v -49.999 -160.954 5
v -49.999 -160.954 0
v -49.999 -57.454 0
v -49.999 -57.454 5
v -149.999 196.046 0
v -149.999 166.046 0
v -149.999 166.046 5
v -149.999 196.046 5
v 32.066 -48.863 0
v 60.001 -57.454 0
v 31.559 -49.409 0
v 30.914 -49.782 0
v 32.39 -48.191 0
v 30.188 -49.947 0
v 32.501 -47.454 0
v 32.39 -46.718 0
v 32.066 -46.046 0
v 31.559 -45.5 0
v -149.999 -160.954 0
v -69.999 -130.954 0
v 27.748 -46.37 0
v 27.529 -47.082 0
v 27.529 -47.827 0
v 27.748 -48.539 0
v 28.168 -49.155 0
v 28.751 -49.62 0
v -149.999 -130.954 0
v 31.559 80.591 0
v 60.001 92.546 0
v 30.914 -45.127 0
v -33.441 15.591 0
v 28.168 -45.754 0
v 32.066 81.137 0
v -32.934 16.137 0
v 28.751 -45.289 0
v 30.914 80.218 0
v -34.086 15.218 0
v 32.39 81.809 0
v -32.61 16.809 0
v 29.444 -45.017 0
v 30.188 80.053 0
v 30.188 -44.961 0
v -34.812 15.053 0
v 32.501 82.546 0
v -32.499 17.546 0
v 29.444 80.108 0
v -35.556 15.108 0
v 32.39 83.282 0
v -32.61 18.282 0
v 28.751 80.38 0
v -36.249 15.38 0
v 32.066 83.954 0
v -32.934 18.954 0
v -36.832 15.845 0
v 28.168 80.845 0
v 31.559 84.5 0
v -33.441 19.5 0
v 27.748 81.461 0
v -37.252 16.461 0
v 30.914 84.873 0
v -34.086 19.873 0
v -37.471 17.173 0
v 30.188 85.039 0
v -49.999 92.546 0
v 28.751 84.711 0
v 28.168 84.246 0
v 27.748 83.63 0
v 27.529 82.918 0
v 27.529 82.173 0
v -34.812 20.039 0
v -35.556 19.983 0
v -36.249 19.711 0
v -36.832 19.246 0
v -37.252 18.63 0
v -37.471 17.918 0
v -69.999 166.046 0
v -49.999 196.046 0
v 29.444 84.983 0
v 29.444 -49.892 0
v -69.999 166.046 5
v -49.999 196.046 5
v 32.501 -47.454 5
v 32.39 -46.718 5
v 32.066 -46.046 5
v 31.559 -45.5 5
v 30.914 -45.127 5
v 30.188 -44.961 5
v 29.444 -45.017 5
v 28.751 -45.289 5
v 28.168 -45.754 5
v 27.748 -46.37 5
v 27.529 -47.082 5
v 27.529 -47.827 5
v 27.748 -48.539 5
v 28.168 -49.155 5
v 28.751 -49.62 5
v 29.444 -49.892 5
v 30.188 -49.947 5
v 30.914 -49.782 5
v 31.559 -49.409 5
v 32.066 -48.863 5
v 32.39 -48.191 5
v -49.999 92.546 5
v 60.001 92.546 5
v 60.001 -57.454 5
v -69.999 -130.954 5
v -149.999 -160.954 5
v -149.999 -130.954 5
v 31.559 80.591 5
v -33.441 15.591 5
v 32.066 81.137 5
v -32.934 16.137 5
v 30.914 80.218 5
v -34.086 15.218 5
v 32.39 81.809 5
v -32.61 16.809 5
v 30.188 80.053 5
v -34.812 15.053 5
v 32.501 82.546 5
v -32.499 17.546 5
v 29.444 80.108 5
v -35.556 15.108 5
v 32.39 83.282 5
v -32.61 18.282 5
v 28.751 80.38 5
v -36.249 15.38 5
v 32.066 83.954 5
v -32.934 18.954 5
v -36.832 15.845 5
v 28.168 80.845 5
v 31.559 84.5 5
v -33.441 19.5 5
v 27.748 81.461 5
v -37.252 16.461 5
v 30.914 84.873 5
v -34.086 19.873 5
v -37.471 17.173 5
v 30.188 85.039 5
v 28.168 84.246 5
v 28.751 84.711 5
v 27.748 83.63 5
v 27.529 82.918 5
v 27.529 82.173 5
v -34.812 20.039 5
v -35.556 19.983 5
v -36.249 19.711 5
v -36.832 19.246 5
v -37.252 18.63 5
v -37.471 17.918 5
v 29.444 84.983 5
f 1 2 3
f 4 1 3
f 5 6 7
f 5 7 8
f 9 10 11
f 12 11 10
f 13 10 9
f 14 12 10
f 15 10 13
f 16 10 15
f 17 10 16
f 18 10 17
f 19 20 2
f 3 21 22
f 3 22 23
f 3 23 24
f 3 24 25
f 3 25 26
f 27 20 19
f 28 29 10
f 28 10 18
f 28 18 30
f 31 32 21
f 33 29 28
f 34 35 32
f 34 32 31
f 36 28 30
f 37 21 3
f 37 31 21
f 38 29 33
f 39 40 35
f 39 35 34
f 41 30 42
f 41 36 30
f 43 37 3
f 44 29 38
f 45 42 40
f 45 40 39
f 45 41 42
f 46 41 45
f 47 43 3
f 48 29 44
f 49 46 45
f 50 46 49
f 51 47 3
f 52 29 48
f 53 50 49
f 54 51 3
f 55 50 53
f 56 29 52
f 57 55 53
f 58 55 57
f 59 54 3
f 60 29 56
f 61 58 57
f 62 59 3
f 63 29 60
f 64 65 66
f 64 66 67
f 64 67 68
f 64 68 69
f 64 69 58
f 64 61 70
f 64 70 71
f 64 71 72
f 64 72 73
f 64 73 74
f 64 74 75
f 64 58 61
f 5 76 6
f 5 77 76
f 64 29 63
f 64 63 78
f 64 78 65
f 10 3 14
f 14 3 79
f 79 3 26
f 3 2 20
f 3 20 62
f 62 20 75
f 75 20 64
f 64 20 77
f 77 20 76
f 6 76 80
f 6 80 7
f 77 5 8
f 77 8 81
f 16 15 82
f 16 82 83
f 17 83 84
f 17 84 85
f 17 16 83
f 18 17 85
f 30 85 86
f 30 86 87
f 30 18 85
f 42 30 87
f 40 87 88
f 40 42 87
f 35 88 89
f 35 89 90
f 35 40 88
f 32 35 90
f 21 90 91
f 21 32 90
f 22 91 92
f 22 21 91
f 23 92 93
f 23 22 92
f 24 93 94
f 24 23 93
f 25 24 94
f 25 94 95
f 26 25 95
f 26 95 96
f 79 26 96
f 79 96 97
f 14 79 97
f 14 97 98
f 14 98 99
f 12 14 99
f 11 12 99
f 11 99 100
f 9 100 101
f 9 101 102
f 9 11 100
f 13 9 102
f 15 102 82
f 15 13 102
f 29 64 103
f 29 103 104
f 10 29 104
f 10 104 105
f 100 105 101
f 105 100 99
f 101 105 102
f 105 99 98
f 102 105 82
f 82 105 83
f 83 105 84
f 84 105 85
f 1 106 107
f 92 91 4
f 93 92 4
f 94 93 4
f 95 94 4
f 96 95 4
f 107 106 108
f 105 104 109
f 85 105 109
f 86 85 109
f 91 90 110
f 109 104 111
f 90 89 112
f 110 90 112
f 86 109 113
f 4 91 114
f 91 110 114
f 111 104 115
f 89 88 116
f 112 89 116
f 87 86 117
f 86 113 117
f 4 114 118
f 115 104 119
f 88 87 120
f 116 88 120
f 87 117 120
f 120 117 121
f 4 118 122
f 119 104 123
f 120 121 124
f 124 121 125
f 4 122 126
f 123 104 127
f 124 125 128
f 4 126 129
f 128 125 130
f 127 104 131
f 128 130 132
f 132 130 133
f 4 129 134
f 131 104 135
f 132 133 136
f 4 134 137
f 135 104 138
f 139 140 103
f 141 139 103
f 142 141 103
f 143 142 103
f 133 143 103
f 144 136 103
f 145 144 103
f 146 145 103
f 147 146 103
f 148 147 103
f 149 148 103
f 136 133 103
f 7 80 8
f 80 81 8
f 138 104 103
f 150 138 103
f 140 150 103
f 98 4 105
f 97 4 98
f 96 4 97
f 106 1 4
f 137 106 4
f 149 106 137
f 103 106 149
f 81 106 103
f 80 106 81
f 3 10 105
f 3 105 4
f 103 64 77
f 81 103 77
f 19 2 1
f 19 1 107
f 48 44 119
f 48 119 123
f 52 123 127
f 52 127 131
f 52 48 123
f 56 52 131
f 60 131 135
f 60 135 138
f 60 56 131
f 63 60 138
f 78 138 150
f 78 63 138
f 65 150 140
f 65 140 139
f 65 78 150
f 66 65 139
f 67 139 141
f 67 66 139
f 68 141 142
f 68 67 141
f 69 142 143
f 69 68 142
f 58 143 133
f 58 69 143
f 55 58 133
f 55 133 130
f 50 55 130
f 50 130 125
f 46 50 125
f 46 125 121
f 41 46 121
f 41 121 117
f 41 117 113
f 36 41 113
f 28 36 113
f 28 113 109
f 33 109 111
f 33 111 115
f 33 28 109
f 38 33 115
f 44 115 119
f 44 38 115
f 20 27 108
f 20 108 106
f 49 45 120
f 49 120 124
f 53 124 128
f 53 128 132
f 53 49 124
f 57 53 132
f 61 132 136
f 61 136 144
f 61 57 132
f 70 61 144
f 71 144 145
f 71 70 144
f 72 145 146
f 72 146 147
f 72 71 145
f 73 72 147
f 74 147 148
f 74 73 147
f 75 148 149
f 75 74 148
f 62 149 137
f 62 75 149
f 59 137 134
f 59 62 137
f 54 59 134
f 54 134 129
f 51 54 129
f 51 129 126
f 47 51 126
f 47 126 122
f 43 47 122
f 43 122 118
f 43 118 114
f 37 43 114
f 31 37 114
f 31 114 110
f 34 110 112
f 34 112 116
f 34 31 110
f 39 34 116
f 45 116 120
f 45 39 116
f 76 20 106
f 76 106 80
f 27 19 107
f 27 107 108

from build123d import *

# Parameters (mm, degrees)
SKETCH1_R           = 2.5
BOSS_EXTRUDE1_DEPTH = 5


with BuildPart() as part:
    # Sketch1 → Boss-Extrude1 (new body)
    with BuildSketch(Plane.XY):
        Polygon((-49.999307958, 92.545526446), (60.000692042, 92.545526446), (60.000692042, -57.454473554), (-49.999307958, -57.454473554), (-49.999307958, -130.954473554), (-49.999307958, -160.954473554), (-149.999307958, -160.954473554), (-149.999307958, -130.954473554), (-69.999307958, -130.954473554), (-69.999307958, 166.045526446), (-149.999307958, 166.045526446), (-149.999307958, 196.045526446), (-49.999307958, 196.045526446), (-49.999307958, 166.045526446), align=None)
        with Locations((-34.999307958, 17.545526446)):
            Circle(SKETCH1_R, mode=Mode.SUBTRACT)
        with Locations((30.000692042, -47.454473554)):
            Circle(SKETCH1_R, mode=Mode.SUBTRACT)
        with Locations((30.000692042, 82.545526446)):
            Circle(SKETCH1_R, mode=Mode.SUBTRACT)
    extrude(amount=BOSS_EXTRUDE1_DEPTH)


solid = part.part
